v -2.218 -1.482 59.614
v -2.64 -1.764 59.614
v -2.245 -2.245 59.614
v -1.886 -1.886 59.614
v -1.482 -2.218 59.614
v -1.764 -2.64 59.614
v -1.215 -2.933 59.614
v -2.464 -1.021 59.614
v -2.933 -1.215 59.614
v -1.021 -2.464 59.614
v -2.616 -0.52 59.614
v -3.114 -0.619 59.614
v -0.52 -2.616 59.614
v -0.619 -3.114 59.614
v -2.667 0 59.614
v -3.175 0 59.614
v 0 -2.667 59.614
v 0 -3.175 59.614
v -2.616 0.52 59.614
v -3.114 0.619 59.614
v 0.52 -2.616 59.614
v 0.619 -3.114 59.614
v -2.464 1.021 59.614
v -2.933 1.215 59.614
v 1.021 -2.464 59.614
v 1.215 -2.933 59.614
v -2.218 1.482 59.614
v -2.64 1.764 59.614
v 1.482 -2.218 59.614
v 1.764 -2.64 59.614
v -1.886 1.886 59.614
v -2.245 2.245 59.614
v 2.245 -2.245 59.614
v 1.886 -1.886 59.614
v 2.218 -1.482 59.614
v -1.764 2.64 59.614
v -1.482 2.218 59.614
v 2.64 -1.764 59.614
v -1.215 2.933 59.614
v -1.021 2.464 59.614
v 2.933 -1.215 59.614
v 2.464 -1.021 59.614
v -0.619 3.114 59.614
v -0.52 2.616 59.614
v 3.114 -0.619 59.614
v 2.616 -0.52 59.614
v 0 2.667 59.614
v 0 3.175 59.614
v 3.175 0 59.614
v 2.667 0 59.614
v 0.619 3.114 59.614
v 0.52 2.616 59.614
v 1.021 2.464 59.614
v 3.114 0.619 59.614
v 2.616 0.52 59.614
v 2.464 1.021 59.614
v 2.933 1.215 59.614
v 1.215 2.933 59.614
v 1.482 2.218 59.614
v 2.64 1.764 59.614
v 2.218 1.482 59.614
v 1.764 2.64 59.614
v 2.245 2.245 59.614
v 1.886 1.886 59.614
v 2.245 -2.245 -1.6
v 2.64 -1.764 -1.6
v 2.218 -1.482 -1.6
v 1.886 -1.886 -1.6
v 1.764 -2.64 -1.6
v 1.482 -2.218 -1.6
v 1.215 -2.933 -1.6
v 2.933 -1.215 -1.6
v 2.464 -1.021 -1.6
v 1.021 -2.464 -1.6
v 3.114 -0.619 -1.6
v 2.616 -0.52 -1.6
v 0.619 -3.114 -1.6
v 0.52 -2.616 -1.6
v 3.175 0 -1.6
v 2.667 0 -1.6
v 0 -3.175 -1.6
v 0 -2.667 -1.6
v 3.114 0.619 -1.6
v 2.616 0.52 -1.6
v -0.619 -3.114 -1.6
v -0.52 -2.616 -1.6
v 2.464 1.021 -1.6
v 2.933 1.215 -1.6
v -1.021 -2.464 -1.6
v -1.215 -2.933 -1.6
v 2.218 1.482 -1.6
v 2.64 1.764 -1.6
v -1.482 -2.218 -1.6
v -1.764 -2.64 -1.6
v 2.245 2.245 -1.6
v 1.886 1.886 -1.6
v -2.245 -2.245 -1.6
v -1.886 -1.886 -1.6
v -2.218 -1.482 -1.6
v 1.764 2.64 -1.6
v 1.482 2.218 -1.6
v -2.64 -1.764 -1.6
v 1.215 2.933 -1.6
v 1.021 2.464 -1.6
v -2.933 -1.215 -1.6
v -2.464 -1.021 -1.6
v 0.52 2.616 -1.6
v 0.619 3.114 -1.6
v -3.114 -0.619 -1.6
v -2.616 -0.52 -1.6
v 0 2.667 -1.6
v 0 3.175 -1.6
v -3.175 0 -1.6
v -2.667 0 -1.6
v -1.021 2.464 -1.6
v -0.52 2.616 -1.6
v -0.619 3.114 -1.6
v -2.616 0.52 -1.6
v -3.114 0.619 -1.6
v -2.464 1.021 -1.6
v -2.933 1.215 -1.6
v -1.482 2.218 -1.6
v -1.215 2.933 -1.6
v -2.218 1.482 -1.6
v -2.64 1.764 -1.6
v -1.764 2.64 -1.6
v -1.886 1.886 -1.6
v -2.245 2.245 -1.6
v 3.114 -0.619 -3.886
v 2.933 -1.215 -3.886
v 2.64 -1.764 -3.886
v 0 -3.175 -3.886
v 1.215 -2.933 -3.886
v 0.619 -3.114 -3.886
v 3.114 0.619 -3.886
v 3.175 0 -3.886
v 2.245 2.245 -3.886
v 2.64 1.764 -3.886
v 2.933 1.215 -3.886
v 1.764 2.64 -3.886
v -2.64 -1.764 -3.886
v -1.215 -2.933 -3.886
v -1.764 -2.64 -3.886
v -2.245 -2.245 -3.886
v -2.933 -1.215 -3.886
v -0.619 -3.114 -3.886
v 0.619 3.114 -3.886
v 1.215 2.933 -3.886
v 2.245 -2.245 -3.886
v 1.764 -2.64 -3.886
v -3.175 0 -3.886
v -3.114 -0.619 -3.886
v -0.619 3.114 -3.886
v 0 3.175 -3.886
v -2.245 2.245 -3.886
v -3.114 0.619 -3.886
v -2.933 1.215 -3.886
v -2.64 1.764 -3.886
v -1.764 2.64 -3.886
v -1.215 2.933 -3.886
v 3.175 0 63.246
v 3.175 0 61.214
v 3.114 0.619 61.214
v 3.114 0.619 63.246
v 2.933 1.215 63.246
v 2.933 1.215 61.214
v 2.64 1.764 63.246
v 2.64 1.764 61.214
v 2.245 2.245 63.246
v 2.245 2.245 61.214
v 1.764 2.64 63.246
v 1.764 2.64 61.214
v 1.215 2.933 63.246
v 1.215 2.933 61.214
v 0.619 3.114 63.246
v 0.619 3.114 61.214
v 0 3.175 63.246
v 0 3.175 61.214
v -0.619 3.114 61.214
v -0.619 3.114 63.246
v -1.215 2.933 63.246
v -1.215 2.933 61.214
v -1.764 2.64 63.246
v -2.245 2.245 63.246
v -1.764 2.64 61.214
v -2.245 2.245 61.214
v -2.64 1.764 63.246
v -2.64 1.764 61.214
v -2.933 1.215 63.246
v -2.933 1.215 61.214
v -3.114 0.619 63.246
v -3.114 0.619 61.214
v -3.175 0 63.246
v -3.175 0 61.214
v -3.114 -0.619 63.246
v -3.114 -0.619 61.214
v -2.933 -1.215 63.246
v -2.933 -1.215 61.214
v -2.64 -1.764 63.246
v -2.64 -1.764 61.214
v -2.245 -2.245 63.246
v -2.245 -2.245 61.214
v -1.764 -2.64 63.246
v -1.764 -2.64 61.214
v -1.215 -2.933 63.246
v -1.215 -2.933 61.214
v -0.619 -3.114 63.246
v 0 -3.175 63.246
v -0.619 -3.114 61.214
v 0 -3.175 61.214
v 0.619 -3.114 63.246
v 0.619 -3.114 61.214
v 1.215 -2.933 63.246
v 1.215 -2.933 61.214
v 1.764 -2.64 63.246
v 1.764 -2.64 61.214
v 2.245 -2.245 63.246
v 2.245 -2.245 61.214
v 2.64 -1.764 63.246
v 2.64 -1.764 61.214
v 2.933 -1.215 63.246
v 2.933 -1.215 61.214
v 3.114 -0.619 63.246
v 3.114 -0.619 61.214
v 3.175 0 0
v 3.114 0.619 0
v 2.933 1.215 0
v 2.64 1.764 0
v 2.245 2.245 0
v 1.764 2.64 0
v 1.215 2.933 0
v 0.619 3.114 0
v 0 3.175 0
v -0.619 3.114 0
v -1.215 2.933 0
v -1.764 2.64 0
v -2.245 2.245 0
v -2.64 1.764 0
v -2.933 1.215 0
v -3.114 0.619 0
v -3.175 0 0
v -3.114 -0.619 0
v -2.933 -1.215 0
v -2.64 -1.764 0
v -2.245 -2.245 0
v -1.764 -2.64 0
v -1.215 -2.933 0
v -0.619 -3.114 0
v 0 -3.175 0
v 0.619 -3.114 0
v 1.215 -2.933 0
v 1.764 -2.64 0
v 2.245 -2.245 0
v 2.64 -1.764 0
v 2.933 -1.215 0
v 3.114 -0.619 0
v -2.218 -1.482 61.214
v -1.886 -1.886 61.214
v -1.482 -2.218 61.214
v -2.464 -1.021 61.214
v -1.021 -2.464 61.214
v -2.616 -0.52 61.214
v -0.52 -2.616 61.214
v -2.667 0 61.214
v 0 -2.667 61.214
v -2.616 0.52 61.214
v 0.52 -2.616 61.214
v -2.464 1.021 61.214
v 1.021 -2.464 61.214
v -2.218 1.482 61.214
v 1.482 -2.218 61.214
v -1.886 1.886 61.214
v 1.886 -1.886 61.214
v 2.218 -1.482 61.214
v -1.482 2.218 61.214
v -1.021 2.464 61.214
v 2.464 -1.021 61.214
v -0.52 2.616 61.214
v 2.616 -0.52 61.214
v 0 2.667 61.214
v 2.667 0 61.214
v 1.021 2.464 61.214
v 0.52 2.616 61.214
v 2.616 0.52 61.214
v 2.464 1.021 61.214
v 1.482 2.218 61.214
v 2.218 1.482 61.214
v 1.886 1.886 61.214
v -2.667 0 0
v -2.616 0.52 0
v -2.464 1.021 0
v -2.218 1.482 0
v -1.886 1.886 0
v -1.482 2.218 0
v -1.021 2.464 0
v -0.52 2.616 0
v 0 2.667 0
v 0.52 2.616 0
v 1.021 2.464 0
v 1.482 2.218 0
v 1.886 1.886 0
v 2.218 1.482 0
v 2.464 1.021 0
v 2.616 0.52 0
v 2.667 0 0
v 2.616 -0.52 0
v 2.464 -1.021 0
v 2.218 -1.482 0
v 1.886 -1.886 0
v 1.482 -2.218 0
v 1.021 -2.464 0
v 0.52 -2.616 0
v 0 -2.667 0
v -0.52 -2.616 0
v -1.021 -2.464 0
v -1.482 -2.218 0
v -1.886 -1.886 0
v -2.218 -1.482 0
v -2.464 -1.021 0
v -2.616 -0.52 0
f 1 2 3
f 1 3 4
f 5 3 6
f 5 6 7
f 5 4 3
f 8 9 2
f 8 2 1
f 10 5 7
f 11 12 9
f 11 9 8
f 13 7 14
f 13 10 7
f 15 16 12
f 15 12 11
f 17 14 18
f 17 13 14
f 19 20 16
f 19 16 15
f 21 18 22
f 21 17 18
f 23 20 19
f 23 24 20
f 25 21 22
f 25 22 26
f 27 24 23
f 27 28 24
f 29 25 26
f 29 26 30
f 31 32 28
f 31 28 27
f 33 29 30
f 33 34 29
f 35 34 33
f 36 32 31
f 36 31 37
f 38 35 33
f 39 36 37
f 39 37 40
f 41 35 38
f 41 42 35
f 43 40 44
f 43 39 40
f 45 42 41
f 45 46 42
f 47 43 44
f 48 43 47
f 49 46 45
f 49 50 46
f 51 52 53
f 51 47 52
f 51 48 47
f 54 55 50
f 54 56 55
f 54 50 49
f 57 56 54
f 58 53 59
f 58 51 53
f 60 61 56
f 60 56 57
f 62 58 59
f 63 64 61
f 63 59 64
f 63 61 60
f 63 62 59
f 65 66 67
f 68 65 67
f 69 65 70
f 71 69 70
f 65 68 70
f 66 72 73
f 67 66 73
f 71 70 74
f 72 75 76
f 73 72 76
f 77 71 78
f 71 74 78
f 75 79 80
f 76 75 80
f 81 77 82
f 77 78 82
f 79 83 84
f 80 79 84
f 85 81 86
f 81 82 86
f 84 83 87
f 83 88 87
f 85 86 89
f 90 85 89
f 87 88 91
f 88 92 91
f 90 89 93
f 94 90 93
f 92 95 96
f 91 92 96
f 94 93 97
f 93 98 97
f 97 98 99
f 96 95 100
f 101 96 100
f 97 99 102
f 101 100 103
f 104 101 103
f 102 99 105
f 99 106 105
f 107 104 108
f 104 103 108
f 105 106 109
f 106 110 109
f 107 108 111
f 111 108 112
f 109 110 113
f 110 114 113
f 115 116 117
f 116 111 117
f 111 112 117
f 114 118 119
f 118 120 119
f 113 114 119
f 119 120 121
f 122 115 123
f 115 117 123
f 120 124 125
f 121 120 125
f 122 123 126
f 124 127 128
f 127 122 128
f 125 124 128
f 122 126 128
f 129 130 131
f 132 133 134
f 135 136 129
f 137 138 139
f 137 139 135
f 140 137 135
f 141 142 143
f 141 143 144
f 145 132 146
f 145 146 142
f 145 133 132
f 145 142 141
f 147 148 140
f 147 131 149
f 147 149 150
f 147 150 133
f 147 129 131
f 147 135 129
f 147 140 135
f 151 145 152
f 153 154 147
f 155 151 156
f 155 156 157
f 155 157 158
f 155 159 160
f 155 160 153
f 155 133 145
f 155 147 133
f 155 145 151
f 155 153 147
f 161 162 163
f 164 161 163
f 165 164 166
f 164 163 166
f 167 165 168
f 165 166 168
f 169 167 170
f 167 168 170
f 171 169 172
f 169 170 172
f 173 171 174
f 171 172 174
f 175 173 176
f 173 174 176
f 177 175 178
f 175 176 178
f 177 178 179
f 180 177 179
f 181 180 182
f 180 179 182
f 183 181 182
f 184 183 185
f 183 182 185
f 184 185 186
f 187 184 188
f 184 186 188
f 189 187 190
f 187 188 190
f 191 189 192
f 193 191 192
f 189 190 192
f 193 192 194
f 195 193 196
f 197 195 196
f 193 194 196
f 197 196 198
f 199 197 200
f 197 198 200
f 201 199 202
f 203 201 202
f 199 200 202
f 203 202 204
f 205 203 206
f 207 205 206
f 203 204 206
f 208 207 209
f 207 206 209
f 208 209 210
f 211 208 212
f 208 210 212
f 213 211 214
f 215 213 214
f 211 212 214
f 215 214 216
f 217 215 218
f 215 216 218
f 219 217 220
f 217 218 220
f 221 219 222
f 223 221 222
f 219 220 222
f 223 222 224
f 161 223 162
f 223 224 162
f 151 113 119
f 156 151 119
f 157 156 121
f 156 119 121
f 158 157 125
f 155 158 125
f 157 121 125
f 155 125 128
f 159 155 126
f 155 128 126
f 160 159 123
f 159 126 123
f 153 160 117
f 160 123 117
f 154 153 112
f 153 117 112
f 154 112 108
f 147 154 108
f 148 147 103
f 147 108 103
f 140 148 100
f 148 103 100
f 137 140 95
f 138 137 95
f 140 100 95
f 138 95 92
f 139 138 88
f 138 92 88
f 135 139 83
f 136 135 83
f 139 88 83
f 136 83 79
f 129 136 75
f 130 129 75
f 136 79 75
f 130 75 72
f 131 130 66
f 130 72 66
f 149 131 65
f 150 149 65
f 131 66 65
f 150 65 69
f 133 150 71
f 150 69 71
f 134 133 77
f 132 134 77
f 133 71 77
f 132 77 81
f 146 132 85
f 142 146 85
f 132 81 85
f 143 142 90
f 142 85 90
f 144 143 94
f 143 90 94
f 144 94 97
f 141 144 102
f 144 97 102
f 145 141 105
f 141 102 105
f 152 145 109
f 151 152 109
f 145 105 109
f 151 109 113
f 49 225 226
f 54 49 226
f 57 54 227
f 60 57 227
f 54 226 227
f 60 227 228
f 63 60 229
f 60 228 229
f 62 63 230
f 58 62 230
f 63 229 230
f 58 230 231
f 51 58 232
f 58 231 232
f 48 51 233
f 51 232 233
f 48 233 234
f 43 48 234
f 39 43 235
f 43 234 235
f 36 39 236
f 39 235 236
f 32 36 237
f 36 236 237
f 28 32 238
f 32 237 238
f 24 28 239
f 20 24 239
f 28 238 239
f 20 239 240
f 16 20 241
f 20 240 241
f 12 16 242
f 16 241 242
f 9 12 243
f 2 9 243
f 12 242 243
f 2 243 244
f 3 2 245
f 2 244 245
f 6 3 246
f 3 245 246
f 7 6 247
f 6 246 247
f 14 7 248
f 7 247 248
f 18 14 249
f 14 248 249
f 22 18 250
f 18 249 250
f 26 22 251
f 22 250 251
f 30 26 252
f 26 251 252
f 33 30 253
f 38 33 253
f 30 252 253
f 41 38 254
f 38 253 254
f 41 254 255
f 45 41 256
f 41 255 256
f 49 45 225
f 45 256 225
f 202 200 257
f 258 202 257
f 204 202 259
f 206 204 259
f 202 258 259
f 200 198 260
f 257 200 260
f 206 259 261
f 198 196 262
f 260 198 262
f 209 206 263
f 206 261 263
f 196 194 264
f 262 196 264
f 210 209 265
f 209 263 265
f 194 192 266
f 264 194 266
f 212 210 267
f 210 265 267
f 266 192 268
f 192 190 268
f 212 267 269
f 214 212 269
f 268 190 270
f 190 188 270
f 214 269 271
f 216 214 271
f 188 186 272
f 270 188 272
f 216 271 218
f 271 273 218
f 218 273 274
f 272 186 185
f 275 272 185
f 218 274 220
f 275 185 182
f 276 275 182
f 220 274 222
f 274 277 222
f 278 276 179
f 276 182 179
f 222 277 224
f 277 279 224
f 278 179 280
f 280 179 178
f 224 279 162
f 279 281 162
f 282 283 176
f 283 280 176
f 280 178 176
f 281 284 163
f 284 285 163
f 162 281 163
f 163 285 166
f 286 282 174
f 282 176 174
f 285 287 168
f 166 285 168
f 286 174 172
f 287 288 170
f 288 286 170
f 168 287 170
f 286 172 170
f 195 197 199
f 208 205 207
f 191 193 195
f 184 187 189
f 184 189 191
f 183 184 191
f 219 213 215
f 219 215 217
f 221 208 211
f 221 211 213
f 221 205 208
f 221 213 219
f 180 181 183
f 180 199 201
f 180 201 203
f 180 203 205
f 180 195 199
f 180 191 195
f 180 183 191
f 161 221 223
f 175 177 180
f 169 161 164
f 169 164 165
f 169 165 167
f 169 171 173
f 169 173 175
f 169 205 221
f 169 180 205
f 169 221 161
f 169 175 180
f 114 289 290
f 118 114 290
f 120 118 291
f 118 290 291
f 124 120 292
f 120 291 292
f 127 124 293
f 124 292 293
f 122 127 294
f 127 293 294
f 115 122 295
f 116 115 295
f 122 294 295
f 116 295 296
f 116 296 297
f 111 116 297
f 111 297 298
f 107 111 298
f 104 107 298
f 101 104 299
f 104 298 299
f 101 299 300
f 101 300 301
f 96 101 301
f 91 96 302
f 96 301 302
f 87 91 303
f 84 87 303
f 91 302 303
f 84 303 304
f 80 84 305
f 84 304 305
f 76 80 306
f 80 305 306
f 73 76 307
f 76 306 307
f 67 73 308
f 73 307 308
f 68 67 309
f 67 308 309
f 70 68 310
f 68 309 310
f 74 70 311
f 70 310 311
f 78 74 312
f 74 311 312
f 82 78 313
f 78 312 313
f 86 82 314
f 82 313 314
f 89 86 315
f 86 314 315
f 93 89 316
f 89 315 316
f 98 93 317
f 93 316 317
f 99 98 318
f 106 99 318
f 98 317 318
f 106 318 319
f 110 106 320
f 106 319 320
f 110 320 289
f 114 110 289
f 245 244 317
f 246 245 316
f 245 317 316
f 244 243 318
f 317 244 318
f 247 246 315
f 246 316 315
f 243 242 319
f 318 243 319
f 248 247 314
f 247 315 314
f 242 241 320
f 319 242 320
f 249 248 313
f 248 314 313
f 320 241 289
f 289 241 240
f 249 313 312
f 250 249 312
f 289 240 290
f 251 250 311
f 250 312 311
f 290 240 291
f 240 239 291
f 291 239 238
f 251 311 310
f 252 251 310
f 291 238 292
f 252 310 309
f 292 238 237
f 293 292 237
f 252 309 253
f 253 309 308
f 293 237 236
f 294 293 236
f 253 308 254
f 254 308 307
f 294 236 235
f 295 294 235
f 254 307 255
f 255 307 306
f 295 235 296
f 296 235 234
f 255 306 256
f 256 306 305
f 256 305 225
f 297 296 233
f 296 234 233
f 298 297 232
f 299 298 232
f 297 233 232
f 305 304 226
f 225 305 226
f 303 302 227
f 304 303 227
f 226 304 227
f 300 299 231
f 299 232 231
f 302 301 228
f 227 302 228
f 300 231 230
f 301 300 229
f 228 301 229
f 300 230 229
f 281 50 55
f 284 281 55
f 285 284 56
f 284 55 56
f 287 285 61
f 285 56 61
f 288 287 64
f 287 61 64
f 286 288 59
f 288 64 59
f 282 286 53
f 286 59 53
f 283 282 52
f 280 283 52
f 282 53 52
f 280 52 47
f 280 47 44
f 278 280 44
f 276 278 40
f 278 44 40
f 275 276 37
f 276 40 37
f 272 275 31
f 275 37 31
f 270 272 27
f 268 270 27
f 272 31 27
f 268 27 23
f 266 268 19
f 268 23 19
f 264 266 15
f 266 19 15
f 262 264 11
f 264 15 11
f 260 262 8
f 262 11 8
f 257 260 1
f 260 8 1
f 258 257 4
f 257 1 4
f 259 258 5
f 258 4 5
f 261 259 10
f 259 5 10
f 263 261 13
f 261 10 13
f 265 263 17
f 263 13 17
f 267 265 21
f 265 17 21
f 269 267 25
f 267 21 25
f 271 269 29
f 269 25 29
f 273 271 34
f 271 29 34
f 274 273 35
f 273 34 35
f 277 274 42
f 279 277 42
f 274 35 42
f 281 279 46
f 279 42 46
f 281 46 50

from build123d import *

# Parameters (mm, degrees)
SKETCH1_R           = 3.175
BOSS_EXTRUDE1_DEPTH = 59.6138
SKETCH2_R           = 2.667
BOSS_EXTRUDE2_DEPTH = 1.6002
SKETCH3_R           = 3.175
BOSS_EXTRUDE3_DEPTH = 2.286
SKETCH4_R           = 2.667
BOSS_EXTRUDE4_DEPTH = 1.6002
SKETCH5_R           = 3.175
BOSS_EXTRUDE5_DEPTH = 2.032


with BuildPart() as part:
    # Sketch1 → Boss-Extrude1 (new body)
    with BuildSketch(Plane.XY):
        Circle(SKETCH1_R)
    extrude(amount=BOSS_EXTRUDE1_DEPTH)

    # Sketch2 → Boss-Extrude2 (add)
    with BuildSketch(Plane(origin=(0, 0, 0), x_dir=(-1, 0, 0), z_dir=(0, 0, -1))):
        Circle(SKETCH2_R)
    extrude(amount=BOSS_EXTRUDE2_DEPTH)

    # Sketch3 → Boss-Extrude3 (add)
    with BuildSketch(Plane(origin=(0, 0, -1.6002), x_dir=(-1, 0, 0), z_dir=(0, 0, -1))):
        Circle(SKETCH3_R)
    extrude(amount=BOSS_EXTRUDE3_DEPTH)

    # Sketch4 → Boss-Extrude4 (add)
    with BuildSketch(Plane.XY.offset(59.6138)):
        Circle(SKETCH4_R)
    extrude(amount=BOSS_EXTRUDE4_DEPTH)

    # Sketch5 → Boss-Extrude5 (add)
    with BuildSketch(Plane.XY.offset(61.214)):
        Circle(SKETCH5_R)
    extrude(amount=BOSS_EXTRUDE5_DEPTH)


solid = part.part
